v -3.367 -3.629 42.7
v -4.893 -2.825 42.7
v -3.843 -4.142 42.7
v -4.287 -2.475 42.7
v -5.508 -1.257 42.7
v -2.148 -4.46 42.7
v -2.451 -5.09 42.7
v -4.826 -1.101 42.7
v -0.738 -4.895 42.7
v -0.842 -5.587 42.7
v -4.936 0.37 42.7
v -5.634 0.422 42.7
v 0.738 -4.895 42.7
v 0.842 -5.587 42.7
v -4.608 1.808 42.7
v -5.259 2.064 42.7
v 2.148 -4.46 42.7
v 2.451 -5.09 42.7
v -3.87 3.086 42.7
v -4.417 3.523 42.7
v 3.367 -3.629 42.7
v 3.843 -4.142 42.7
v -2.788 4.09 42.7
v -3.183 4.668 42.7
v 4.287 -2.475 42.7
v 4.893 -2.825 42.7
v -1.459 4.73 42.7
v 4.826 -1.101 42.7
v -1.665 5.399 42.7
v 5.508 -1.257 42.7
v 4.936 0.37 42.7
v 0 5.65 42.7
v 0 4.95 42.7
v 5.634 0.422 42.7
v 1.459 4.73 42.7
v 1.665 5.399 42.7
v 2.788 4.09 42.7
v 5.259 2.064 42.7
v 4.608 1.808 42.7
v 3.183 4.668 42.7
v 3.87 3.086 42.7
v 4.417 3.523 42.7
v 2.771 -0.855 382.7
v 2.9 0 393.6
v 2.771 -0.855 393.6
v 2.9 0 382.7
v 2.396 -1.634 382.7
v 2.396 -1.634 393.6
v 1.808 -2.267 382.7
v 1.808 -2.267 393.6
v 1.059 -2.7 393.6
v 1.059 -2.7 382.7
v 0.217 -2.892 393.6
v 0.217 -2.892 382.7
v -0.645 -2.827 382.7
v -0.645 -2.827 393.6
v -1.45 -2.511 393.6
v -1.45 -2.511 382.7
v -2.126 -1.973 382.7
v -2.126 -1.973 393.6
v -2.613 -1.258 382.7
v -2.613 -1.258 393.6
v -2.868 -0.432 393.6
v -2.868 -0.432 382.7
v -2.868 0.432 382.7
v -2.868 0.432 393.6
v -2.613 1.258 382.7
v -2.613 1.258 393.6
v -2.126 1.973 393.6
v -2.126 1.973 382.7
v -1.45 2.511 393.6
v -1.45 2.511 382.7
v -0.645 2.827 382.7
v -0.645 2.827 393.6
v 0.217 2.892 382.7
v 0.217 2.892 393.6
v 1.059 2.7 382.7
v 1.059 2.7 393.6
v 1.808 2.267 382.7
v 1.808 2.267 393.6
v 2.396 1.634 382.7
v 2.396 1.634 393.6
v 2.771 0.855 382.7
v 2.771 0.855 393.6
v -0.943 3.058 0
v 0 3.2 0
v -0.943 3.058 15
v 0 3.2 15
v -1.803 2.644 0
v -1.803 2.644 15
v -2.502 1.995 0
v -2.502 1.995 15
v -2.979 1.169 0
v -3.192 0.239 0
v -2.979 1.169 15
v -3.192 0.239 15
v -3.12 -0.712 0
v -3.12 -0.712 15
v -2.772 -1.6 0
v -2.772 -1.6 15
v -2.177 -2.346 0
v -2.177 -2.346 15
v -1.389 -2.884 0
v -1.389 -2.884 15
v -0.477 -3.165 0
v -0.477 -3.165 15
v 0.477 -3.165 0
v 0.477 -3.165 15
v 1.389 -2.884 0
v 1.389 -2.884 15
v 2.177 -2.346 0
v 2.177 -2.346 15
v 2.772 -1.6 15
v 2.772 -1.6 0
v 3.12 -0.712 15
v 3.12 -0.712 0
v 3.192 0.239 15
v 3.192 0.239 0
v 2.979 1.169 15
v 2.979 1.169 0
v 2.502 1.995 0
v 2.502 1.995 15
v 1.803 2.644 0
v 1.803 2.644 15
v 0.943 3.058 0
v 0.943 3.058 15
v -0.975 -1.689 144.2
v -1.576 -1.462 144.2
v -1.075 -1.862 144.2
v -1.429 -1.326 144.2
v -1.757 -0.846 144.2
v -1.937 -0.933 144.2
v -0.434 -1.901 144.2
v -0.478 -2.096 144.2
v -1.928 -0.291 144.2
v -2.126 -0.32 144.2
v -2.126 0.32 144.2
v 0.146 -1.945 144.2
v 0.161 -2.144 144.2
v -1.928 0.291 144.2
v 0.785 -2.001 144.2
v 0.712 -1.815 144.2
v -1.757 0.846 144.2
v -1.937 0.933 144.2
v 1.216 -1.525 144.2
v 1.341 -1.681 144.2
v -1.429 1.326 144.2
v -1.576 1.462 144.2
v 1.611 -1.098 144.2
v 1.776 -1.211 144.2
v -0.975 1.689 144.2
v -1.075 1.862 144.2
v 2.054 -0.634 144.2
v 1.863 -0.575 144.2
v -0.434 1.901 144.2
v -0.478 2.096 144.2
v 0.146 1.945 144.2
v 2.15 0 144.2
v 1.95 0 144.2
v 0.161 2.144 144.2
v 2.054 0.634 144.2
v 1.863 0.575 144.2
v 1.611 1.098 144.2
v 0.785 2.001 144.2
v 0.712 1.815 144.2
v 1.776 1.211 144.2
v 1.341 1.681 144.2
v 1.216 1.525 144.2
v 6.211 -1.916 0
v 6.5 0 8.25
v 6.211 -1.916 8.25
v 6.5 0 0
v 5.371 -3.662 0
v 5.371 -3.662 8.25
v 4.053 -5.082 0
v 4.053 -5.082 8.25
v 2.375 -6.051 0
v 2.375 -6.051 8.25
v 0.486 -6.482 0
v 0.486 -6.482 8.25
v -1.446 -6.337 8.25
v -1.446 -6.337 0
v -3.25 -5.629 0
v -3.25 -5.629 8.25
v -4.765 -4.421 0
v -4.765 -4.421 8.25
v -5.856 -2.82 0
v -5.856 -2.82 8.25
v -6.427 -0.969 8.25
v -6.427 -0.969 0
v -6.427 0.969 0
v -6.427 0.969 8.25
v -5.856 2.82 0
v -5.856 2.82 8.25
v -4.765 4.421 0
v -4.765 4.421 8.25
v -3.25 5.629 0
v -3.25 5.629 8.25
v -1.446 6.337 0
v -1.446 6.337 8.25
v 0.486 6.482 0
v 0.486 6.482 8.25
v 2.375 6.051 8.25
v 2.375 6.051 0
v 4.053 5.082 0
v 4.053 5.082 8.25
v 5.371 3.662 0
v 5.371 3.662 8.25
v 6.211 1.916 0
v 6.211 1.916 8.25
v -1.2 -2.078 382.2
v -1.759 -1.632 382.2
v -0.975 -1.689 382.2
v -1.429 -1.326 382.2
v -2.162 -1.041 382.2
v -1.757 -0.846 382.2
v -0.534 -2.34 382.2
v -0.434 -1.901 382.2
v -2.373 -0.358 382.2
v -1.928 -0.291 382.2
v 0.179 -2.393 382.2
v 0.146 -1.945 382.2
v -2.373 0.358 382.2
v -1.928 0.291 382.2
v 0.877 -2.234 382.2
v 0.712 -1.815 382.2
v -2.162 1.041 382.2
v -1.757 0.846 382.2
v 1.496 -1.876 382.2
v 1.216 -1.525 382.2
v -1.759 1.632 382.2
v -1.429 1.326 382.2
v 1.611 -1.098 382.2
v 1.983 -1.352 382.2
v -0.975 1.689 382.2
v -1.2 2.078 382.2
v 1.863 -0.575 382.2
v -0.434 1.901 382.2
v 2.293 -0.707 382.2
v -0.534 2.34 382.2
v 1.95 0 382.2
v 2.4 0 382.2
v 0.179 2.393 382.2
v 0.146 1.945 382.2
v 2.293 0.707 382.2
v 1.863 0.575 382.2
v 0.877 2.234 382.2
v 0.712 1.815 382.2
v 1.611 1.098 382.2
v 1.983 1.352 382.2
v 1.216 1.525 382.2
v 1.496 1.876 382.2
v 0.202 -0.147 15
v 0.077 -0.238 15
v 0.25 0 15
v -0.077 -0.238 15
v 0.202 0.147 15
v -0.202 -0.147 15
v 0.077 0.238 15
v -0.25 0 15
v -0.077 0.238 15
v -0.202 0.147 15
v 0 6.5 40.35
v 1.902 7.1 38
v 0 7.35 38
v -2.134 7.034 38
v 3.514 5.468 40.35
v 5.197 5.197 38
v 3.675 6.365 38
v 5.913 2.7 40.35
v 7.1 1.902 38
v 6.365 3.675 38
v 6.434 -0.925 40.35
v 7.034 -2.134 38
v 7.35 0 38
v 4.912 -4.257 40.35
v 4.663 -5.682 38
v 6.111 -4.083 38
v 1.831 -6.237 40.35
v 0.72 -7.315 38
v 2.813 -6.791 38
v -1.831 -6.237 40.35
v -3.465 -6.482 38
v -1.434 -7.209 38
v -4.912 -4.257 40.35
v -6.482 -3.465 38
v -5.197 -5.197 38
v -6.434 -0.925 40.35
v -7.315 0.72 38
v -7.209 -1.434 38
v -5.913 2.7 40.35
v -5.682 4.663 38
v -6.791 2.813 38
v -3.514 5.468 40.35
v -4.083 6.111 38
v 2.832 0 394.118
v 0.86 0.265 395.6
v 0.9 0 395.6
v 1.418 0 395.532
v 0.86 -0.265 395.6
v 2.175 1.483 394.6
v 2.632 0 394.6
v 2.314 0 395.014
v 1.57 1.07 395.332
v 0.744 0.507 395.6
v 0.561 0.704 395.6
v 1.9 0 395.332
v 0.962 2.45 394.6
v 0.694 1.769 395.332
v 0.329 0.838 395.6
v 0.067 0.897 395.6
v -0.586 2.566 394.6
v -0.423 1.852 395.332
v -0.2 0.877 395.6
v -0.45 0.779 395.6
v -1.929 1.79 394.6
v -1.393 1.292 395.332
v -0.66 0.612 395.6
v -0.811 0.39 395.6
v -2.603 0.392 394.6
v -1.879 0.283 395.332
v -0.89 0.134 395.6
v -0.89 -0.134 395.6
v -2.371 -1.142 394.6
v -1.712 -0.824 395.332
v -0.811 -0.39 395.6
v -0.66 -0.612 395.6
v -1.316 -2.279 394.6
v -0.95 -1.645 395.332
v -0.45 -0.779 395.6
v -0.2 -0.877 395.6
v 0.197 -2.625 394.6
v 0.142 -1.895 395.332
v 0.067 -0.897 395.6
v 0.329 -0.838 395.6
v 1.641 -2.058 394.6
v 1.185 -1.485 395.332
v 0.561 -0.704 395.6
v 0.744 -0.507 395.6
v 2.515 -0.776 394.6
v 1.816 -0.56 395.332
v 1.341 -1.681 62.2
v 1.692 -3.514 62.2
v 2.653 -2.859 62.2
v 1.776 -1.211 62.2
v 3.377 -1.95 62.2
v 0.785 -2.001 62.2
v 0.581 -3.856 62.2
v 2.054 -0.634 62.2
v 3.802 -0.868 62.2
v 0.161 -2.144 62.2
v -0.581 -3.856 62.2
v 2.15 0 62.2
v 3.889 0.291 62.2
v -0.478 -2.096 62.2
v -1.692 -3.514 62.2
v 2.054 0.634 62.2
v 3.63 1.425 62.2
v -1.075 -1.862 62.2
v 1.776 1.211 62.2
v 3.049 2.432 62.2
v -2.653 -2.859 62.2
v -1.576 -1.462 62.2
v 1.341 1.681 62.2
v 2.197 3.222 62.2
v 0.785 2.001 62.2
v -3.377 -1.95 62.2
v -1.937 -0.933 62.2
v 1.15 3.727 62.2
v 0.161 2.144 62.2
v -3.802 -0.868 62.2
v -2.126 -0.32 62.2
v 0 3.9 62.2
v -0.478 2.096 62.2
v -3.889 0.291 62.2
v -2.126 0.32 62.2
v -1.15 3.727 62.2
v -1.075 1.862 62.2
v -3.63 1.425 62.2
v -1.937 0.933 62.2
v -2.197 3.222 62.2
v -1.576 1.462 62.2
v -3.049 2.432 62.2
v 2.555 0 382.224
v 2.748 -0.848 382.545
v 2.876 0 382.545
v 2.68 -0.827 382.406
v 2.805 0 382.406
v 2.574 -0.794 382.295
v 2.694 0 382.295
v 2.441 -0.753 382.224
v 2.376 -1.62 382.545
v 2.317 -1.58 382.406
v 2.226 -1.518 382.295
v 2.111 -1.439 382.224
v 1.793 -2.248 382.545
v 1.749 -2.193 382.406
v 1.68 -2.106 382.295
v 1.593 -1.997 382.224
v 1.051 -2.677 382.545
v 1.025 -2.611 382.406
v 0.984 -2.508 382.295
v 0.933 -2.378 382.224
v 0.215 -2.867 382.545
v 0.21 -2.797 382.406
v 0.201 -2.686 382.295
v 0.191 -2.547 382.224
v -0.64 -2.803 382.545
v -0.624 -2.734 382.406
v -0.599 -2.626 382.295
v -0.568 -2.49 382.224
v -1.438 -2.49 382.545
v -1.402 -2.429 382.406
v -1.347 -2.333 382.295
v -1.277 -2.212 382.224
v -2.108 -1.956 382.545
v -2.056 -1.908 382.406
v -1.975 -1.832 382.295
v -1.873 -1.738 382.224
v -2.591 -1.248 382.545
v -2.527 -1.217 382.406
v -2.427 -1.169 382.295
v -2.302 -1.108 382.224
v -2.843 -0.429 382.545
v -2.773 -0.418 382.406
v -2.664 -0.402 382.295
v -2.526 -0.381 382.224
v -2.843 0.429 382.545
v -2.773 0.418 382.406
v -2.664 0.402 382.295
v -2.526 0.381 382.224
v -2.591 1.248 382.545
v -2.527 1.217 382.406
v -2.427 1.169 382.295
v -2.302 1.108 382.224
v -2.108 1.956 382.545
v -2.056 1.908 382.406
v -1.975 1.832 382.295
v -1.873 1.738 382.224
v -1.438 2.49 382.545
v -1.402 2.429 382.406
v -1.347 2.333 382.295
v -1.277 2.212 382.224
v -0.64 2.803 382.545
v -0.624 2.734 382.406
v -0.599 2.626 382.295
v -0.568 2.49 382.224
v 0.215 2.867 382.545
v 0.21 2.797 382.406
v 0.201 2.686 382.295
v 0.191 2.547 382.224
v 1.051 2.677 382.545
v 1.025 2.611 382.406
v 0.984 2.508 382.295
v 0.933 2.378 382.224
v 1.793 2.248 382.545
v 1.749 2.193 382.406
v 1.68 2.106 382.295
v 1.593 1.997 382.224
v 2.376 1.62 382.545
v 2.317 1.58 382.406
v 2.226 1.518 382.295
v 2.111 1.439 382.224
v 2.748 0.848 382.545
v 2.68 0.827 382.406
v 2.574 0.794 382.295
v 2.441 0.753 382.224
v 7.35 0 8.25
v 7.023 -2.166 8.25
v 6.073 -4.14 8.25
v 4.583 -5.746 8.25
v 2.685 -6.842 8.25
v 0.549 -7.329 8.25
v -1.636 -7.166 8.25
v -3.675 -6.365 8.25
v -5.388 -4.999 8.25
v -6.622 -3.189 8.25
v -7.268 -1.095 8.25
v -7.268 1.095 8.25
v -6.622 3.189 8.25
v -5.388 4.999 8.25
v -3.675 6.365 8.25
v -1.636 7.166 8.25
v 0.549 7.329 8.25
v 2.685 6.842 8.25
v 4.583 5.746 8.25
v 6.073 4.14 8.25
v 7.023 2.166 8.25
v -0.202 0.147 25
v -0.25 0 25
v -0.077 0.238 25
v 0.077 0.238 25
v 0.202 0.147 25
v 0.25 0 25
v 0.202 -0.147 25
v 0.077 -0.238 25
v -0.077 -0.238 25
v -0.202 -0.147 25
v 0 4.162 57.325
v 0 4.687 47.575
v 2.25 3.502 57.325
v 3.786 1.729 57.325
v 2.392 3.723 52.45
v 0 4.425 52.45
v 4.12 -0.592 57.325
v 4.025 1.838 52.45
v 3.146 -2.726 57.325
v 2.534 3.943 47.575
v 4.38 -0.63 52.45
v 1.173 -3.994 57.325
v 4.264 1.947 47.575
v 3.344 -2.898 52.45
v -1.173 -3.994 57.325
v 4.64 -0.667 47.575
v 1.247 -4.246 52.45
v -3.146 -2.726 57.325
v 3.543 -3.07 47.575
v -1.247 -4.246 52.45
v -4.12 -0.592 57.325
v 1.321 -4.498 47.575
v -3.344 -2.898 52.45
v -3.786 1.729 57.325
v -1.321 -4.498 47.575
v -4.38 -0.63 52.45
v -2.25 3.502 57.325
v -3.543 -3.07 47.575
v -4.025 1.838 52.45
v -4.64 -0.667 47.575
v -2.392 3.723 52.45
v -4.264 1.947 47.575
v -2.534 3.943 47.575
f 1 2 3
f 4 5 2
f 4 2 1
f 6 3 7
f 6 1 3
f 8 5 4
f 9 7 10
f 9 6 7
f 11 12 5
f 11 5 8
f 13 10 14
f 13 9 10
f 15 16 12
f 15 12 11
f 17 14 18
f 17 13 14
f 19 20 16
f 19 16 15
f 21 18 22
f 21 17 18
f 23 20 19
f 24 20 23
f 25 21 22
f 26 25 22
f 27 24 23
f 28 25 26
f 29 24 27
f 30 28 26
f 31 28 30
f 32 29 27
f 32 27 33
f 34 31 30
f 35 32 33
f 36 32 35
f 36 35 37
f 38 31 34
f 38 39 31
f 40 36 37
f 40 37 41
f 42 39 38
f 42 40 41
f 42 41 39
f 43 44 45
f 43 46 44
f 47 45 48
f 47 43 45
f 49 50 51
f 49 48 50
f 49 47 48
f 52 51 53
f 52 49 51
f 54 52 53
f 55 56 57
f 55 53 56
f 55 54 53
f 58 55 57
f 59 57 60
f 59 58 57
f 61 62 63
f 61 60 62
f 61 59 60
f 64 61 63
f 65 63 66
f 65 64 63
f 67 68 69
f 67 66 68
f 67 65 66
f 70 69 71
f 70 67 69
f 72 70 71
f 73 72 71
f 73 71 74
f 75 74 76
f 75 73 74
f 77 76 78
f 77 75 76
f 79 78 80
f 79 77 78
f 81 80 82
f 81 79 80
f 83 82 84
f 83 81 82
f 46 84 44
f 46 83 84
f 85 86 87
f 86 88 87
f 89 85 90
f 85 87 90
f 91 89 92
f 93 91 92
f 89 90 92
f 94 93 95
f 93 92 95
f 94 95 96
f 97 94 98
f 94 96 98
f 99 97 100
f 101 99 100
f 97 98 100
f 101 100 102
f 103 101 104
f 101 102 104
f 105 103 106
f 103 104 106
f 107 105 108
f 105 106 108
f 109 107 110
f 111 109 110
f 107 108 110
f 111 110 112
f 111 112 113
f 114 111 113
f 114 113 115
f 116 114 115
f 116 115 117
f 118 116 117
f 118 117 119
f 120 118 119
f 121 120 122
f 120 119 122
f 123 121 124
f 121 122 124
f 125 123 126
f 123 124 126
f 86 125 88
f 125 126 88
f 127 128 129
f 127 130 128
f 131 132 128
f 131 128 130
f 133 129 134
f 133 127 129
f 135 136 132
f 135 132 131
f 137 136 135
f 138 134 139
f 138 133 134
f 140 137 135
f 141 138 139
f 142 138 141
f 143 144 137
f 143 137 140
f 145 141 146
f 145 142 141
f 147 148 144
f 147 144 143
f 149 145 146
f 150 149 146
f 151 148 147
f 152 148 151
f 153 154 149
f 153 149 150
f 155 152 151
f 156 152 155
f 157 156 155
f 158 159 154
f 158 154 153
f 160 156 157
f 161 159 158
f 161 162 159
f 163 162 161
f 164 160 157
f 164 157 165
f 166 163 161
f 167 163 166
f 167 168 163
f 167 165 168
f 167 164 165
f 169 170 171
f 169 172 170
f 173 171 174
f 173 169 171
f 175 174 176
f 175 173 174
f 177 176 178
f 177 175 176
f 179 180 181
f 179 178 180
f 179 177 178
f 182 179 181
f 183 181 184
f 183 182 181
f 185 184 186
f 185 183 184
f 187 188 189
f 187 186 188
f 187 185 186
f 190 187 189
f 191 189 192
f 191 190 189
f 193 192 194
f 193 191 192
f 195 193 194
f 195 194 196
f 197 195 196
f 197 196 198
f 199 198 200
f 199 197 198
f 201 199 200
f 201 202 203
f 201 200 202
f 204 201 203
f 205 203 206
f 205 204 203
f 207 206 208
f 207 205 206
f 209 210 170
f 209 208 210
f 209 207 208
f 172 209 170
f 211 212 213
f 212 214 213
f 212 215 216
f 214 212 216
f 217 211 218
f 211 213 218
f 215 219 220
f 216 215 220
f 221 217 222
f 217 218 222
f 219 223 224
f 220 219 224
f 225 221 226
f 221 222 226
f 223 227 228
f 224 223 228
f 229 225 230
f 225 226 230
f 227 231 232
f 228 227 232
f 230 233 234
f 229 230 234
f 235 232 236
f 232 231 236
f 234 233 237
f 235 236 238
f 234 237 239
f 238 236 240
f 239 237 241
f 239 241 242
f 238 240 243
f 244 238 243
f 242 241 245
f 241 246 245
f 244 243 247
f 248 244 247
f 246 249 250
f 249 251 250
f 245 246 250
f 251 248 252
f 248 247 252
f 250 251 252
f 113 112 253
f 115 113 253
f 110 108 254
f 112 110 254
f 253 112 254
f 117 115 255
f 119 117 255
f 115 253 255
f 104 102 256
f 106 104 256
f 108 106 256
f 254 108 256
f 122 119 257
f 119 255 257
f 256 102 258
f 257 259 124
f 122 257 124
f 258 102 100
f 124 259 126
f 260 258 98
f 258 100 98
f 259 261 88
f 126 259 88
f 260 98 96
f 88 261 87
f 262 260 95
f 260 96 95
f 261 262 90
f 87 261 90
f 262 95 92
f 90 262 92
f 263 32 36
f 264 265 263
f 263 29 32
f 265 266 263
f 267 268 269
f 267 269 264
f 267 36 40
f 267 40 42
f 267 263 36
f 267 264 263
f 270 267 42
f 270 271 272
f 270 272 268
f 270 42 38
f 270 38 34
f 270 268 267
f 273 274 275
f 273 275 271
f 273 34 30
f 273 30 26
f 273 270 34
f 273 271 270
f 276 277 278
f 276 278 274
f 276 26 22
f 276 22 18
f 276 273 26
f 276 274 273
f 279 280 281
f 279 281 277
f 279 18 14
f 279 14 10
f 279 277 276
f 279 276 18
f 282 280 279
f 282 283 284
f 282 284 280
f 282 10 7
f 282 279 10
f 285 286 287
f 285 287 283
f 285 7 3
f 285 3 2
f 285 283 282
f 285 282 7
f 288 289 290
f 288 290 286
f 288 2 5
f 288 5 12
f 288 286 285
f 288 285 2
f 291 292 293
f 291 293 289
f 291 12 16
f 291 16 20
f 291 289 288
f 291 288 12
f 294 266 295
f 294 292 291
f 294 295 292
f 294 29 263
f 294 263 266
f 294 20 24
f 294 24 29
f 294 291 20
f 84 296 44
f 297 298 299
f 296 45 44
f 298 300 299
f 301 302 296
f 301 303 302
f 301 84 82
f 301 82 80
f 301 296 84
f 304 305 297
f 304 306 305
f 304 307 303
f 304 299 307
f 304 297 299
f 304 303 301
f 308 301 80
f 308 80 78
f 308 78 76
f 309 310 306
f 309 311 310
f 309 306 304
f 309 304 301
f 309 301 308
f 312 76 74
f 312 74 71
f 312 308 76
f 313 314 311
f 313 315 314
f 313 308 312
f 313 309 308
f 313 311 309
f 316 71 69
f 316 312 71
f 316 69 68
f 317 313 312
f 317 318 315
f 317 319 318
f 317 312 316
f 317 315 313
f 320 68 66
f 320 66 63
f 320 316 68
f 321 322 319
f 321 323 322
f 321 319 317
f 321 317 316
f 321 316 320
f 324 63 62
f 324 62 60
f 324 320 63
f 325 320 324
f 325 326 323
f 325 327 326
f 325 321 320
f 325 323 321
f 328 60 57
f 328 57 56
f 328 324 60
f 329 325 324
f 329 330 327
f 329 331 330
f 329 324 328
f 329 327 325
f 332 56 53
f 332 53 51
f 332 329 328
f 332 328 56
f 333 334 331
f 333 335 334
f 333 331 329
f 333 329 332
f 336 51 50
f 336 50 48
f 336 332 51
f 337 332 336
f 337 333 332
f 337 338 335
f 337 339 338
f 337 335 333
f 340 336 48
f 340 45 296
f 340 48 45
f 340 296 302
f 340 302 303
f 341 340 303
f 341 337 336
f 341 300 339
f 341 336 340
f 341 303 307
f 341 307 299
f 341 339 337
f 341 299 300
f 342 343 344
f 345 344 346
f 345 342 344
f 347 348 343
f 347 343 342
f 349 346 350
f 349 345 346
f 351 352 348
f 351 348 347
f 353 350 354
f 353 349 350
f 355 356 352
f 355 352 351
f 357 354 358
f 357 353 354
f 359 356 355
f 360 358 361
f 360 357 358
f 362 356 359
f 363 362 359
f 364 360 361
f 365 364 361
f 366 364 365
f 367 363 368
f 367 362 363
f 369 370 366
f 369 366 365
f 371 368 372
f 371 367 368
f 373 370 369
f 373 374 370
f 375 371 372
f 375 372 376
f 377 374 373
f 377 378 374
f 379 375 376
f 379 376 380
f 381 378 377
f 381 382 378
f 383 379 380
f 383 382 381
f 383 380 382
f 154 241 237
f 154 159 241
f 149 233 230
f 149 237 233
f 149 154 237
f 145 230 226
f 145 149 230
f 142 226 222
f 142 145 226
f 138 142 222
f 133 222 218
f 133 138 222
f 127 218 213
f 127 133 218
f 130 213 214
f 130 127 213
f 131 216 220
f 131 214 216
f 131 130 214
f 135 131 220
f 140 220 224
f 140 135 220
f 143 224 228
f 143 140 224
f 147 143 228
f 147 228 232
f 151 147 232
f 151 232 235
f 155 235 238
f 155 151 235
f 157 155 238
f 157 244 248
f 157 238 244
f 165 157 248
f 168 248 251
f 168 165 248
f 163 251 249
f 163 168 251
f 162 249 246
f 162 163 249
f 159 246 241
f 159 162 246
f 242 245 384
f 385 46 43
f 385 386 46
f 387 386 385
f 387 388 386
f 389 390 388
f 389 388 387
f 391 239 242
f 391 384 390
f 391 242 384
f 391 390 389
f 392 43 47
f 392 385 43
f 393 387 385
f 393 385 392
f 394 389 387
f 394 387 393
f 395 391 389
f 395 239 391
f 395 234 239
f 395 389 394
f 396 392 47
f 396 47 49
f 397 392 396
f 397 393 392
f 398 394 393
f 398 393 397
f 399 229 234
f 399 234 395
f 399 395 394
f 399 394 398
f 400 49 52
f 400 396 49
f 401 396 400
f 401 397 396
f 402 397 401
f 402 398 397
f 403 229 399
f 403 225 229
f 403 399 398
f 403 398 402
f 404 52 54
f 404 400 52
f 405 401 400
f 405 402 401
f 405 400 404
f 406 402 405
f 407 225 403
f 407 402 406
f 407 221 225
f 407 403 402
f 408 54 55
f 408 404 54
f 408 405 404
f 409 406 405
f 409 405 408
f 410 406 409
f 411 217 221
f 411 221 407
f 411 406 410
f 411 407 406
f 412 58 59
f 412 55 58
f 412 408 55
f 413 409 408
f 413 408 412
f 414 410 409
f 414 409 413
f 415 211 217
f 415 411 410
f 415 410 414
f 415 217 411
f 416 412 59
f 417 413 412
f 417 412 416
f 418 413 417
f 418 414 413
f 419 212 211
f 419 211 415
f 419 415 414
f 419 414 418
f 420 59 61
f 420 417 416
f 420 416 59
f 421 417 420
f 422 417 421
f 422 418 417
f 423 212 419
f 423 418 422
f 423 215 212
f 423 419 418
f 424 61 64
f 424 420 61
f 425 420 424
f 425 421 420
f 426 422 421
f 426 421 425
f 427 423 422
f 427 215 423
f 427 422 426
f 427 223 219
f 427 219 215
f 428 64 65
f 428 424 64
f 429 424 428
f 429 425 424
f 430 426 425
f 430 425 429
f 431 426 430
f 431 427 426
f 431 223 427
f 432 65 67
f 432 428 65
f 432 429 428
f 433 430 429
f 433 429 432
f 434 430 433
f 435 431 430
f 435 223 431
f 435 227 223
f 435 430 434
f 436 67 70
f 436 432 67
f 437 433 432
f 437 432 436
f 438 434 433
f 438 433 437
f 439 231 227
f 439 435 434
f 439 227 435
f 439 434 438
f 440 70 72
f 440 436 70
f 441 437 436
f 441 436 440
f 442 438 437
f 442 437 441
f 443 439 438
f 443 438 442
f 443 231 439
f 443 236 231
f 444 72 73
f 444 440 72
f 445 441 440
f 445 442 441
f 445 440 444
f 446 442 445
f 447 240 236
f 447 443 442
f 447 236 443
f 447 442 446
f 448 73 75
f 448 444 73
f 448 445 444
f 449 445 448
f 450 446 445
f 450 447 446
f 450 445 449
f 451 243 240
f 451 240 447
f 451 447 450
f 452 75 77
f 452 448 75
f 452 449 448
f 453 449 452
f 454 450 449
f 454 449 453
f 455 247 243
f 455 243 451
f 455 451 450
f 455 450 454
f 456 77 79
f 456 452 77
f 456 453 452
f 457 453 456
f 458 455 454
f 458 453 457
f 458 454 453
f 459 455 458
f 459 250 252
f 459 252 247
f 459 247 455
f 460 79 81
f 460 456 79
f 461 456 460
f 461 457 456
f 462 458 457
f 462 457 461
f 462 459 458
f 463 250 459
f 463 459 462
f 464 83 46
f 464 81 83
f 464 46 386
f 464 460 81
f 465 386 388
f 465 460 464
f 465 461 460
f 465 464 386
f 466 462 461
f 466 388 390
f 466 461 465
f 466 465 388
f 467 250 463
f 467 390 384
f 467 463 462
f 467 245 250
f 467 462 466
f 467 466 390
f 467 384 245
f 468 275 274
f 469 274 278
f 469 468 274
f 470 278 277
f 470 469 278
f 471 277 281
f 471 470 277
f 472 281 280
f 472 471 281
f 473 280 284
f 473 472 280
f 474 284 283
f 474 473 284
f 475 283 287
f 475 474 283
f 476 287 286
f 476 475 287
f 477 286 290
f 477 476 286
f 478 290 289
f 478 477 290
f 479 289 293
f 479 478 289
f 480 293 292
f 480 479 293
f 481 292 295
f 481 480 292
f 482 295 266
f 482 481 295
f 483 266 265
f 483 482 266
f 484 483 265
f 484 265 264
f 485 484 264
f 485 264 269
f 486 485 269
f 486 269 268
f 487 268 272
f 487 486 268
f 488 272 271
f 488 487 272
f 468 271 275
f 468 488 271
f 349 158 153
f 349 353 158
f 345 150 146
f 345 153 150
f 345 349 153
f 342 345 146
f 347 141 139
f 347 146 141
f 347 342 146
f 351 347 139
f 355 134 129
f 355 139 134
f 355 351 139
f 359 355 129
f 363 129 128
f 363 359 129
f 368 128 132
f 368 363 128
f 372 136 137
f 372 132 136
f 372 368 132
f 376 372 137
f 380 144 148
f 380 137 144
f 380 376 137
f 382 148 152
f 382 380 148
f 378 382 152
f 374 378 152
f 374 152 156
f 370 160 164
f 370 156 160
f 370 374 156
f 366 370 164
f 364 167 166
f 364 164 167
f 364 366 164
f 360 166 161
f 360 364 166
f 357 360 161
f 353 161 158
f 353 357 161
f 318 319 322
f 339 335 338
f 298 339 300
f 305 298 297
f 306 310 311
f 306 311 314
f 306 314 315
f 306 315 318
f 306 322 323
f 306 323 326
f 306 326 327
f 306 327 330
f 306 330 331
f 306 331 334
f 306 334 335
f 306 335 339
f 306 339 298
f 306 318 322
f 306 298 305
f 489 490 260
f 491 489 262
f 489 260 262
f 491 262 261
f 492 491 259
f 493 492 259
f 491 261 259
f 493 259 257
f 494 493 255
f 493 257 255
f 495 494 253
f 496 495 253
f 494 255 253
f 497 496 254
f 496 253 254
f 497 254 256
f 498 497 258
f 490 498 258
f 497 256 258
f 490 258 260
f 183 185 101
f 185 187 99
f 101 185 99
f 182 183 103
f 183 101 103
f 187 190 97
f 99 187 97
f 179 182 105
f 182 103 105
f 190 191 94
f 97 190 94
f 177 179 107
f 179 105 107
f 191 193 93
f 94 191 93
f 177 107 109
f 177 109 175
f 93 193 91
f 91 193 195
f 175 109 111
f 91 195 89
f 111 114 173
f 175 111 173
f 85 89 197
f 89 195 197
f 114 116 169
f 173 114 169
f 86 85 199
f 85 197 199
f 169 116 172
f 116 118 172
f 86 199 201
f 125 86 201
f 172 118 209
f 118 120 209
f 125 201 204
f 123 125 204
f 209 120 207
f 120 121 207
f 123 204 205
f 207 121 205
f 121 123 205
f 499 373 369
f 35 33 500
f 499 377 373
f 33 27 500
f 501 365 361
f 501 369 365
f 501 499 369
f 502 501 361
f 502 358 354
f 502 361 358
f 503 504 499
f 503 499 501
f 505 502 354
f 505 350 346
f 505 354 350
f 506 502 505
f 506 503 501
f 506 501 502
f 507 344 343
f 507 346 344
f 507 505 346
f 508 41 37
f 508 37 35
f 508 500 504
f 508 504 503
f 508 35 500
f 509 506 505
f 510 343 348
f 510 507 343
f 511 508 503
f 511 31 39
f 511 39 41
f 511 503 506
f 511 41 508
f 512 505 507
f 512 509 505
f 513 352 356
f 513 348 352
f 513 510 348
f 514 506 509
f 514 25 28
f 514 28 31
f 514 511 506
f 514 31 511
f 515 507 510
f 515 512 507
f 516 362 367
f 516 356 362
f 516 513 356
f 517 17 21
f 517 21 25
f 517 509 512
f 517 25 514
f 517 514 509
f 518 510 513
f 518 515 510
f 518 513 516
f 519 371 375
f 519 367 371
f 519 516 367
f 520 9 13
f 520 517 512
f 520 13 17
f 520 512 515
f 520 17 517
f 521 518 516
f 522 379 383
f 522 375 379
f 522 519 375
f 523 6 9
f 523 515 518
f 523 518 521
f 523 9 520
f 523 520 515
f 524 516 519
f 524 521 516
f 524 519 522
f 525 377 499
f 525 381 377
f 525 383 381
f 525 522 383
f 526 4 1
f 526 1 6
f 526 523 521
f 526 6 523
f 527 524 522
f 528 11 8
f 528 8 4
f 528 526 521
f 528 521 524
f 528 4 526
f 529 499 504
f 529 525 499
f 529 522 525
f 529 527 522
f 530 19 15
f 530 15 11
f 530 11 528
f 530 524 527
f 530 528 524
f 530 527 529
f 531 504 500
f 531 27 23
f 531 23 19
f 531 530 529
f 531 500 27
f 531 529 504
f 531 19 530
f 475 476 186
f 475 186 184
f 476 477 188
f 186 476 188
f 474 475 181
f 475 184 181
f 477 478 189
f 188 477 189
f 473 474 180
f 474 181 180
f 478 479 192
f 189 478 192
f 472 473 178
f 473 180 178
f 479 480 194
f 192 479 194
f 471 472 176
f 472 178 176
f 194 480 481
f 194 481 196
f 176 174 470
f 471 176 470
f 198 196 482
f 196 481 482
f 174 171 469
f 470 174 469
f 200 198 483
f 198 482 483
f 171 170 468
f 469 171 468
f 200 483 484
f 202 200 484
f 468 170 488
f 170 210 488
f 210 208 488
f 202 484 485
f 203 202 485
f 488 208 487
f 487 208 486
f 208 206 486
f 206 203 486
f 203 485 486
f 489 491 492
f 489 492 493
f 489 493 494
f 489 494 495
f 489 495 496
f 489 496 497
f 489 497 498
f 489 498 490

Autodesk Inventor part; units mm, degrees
ref_plane "YZ Plane" through (0, 0, 0) normal (1, 0, 0) x (0, 1, 0)
ref_plane "XZ Plane" through (0, 0, 0) normal (0, 1, 0) x (-1, 0, 0)
ref_plane "XY Plane" through (0, 0, 0) normal (0, 0, 1) x (1, 0, 0)
sketch "Boceto1" plane through (0, 0, 0) normal (0, 0, 1) x (1, 0, 0)
  circle A0 centre (0, 0) radius 6.5
  dimension "d0" = 13
extrude "Extrusión1" add sketch "Boceto1" along normal blind 8.25
sketch "Boceto2" plane through (0, 0, 8.25) normal (0, 0, 1) x (1, 0, 0)
  circle A0 centre (0, 0) radius 6.5 projected
  circle A1 centre (0, 0) radius 7.35
  dimension "d3" = 14.7
extrude "Extrusión2" add sketch "Boceto2" along normal blind 29.75 contours A0 | A1
sketch "Boceto3" plane through (0, 0, 38) normal (0, 0, 1) x (1, 0, 0)
  circle A0 centre (0, 0) radius 7.35 projected
  circle A1 centre (0, 0) radius 5.65
  dimension "d6" = 11.3
extrude "Extrusión3" add sketch "Boceto3" along normal blind 4.7 contours A1
sketch "Boceto4" plane through (0, 0, 0) normal (1, 0, 0) x (0, 1, 0)
  line L0 (5.65, 42.7) -> (-5.65, 42.7) projected
  line L1 (7.35, 38) -> (-7.35, 38) projected
  line L2 (5.65, 42.7) -> (7.35, 38)
  line L3 (5.65, 38) -> (5.65, 42.7)
  line L4 (0, 42.7) -> (0, 50.6655) construction
  point P0 (0, 0)
revolve "Revolución1" add sketch "Boceto4" angle 360 about axis through (0, 0, 42.7) along (0, 0, 1)
sketch "Boceto7" plane through (0, 0, 0) normal (1, 0, 0) x (0, 1, 0)
  line L0 (5.65, 42.7) -> (-5.65, 42.7) projected
  line L1 (0, 42.7) -> (4.95, 42.7) construction
  line L2 (0, 42.7) -> (0, 62.2)
  line L3 (0, 62.2) -> (3.9, 62.2)
  line L4 (3.9, 62.2) -> (4.95, 42.7)
  point P0 (0, 0)
  dimension "d13" = 4.95
  dimension "d14" = 19.5
  dimension "d15" = 3.9
revolve "Revolución2" add sketch "Boceto7" angle 360 about axis through (0, 0, 42.7) along (0, 0, 1)
sketch "Boceto8" plane through (0, 0, 62.2) normal (0, 0, 1) x (1, 0, 0)
  circle A0 centre (0, 0) radius 3.9 projected
  circle A1 centre (0, 0) radius 2.15
  dimension "d17" = 4.3
extrude "Extrusión5" add sketch "Boceto8" along normal blind 82 contours A1
sketch "Boceto9" plane through (0, 0, 144.2) normal (0, 0, 1) x (1, 0, 0)
  circle A0 centre (0, 0) radius 2.15 projected
  circle A1 centre (0, 0) radius 1.95
  dimension "d20" = 3.9
extrude "Extrusión6" add sketch "Boceto9" along normal blind 238 contours A1
sketch "Boceto10" plane through (0, 0, 382.2) normal (0, 0, 1) x (1, 0, 0)
  circle A0 centre (0, 0) radius 1.95 projected
  circle A1 centre (0, 0) radius 2.9
  dimension "d23" = 5.8
extrude "Extrusión7" add sketch "Boceto10" along normal blind 13.4 contours A0 | A1
fillet "Empalme1" radius 2 1 edges at (-2.9, 0, 395.6)
fillet "Empalme2" radius 0.5 1 edges at (-2.9, 0, 382.2)
sketch "Boceto11" plane through (0, 0, 0) normal (0, 0, -1) x (-1, 0, 0)
  circle A0 centre (0, 0) radius 6.5 projected
  circle A1 centre (0, 0) radius 3.05
  dimension "d28" = 6.1
hole "Hole1" at (0, 0, 0) direction (0, 0, 1) diameter 6.401 depth 15 thread size "5/16-18 UNC" class "1B" standard "ANSI Unified Screw Threads"
sketch "Boceto12" plane through (0, 0, 15) normal (0, 0, -1) x (-1, 0, 0)
  circle A0 centre (0, 0) radius 3.2005 projected
  circle A1 centre (0, 0) radius 0.25
  dimension "d36" = 0.5
extrude "Extrusión8" cut sketch "Boceto12" against normal blind 10 contours A1
properties part number "nagoya771"
